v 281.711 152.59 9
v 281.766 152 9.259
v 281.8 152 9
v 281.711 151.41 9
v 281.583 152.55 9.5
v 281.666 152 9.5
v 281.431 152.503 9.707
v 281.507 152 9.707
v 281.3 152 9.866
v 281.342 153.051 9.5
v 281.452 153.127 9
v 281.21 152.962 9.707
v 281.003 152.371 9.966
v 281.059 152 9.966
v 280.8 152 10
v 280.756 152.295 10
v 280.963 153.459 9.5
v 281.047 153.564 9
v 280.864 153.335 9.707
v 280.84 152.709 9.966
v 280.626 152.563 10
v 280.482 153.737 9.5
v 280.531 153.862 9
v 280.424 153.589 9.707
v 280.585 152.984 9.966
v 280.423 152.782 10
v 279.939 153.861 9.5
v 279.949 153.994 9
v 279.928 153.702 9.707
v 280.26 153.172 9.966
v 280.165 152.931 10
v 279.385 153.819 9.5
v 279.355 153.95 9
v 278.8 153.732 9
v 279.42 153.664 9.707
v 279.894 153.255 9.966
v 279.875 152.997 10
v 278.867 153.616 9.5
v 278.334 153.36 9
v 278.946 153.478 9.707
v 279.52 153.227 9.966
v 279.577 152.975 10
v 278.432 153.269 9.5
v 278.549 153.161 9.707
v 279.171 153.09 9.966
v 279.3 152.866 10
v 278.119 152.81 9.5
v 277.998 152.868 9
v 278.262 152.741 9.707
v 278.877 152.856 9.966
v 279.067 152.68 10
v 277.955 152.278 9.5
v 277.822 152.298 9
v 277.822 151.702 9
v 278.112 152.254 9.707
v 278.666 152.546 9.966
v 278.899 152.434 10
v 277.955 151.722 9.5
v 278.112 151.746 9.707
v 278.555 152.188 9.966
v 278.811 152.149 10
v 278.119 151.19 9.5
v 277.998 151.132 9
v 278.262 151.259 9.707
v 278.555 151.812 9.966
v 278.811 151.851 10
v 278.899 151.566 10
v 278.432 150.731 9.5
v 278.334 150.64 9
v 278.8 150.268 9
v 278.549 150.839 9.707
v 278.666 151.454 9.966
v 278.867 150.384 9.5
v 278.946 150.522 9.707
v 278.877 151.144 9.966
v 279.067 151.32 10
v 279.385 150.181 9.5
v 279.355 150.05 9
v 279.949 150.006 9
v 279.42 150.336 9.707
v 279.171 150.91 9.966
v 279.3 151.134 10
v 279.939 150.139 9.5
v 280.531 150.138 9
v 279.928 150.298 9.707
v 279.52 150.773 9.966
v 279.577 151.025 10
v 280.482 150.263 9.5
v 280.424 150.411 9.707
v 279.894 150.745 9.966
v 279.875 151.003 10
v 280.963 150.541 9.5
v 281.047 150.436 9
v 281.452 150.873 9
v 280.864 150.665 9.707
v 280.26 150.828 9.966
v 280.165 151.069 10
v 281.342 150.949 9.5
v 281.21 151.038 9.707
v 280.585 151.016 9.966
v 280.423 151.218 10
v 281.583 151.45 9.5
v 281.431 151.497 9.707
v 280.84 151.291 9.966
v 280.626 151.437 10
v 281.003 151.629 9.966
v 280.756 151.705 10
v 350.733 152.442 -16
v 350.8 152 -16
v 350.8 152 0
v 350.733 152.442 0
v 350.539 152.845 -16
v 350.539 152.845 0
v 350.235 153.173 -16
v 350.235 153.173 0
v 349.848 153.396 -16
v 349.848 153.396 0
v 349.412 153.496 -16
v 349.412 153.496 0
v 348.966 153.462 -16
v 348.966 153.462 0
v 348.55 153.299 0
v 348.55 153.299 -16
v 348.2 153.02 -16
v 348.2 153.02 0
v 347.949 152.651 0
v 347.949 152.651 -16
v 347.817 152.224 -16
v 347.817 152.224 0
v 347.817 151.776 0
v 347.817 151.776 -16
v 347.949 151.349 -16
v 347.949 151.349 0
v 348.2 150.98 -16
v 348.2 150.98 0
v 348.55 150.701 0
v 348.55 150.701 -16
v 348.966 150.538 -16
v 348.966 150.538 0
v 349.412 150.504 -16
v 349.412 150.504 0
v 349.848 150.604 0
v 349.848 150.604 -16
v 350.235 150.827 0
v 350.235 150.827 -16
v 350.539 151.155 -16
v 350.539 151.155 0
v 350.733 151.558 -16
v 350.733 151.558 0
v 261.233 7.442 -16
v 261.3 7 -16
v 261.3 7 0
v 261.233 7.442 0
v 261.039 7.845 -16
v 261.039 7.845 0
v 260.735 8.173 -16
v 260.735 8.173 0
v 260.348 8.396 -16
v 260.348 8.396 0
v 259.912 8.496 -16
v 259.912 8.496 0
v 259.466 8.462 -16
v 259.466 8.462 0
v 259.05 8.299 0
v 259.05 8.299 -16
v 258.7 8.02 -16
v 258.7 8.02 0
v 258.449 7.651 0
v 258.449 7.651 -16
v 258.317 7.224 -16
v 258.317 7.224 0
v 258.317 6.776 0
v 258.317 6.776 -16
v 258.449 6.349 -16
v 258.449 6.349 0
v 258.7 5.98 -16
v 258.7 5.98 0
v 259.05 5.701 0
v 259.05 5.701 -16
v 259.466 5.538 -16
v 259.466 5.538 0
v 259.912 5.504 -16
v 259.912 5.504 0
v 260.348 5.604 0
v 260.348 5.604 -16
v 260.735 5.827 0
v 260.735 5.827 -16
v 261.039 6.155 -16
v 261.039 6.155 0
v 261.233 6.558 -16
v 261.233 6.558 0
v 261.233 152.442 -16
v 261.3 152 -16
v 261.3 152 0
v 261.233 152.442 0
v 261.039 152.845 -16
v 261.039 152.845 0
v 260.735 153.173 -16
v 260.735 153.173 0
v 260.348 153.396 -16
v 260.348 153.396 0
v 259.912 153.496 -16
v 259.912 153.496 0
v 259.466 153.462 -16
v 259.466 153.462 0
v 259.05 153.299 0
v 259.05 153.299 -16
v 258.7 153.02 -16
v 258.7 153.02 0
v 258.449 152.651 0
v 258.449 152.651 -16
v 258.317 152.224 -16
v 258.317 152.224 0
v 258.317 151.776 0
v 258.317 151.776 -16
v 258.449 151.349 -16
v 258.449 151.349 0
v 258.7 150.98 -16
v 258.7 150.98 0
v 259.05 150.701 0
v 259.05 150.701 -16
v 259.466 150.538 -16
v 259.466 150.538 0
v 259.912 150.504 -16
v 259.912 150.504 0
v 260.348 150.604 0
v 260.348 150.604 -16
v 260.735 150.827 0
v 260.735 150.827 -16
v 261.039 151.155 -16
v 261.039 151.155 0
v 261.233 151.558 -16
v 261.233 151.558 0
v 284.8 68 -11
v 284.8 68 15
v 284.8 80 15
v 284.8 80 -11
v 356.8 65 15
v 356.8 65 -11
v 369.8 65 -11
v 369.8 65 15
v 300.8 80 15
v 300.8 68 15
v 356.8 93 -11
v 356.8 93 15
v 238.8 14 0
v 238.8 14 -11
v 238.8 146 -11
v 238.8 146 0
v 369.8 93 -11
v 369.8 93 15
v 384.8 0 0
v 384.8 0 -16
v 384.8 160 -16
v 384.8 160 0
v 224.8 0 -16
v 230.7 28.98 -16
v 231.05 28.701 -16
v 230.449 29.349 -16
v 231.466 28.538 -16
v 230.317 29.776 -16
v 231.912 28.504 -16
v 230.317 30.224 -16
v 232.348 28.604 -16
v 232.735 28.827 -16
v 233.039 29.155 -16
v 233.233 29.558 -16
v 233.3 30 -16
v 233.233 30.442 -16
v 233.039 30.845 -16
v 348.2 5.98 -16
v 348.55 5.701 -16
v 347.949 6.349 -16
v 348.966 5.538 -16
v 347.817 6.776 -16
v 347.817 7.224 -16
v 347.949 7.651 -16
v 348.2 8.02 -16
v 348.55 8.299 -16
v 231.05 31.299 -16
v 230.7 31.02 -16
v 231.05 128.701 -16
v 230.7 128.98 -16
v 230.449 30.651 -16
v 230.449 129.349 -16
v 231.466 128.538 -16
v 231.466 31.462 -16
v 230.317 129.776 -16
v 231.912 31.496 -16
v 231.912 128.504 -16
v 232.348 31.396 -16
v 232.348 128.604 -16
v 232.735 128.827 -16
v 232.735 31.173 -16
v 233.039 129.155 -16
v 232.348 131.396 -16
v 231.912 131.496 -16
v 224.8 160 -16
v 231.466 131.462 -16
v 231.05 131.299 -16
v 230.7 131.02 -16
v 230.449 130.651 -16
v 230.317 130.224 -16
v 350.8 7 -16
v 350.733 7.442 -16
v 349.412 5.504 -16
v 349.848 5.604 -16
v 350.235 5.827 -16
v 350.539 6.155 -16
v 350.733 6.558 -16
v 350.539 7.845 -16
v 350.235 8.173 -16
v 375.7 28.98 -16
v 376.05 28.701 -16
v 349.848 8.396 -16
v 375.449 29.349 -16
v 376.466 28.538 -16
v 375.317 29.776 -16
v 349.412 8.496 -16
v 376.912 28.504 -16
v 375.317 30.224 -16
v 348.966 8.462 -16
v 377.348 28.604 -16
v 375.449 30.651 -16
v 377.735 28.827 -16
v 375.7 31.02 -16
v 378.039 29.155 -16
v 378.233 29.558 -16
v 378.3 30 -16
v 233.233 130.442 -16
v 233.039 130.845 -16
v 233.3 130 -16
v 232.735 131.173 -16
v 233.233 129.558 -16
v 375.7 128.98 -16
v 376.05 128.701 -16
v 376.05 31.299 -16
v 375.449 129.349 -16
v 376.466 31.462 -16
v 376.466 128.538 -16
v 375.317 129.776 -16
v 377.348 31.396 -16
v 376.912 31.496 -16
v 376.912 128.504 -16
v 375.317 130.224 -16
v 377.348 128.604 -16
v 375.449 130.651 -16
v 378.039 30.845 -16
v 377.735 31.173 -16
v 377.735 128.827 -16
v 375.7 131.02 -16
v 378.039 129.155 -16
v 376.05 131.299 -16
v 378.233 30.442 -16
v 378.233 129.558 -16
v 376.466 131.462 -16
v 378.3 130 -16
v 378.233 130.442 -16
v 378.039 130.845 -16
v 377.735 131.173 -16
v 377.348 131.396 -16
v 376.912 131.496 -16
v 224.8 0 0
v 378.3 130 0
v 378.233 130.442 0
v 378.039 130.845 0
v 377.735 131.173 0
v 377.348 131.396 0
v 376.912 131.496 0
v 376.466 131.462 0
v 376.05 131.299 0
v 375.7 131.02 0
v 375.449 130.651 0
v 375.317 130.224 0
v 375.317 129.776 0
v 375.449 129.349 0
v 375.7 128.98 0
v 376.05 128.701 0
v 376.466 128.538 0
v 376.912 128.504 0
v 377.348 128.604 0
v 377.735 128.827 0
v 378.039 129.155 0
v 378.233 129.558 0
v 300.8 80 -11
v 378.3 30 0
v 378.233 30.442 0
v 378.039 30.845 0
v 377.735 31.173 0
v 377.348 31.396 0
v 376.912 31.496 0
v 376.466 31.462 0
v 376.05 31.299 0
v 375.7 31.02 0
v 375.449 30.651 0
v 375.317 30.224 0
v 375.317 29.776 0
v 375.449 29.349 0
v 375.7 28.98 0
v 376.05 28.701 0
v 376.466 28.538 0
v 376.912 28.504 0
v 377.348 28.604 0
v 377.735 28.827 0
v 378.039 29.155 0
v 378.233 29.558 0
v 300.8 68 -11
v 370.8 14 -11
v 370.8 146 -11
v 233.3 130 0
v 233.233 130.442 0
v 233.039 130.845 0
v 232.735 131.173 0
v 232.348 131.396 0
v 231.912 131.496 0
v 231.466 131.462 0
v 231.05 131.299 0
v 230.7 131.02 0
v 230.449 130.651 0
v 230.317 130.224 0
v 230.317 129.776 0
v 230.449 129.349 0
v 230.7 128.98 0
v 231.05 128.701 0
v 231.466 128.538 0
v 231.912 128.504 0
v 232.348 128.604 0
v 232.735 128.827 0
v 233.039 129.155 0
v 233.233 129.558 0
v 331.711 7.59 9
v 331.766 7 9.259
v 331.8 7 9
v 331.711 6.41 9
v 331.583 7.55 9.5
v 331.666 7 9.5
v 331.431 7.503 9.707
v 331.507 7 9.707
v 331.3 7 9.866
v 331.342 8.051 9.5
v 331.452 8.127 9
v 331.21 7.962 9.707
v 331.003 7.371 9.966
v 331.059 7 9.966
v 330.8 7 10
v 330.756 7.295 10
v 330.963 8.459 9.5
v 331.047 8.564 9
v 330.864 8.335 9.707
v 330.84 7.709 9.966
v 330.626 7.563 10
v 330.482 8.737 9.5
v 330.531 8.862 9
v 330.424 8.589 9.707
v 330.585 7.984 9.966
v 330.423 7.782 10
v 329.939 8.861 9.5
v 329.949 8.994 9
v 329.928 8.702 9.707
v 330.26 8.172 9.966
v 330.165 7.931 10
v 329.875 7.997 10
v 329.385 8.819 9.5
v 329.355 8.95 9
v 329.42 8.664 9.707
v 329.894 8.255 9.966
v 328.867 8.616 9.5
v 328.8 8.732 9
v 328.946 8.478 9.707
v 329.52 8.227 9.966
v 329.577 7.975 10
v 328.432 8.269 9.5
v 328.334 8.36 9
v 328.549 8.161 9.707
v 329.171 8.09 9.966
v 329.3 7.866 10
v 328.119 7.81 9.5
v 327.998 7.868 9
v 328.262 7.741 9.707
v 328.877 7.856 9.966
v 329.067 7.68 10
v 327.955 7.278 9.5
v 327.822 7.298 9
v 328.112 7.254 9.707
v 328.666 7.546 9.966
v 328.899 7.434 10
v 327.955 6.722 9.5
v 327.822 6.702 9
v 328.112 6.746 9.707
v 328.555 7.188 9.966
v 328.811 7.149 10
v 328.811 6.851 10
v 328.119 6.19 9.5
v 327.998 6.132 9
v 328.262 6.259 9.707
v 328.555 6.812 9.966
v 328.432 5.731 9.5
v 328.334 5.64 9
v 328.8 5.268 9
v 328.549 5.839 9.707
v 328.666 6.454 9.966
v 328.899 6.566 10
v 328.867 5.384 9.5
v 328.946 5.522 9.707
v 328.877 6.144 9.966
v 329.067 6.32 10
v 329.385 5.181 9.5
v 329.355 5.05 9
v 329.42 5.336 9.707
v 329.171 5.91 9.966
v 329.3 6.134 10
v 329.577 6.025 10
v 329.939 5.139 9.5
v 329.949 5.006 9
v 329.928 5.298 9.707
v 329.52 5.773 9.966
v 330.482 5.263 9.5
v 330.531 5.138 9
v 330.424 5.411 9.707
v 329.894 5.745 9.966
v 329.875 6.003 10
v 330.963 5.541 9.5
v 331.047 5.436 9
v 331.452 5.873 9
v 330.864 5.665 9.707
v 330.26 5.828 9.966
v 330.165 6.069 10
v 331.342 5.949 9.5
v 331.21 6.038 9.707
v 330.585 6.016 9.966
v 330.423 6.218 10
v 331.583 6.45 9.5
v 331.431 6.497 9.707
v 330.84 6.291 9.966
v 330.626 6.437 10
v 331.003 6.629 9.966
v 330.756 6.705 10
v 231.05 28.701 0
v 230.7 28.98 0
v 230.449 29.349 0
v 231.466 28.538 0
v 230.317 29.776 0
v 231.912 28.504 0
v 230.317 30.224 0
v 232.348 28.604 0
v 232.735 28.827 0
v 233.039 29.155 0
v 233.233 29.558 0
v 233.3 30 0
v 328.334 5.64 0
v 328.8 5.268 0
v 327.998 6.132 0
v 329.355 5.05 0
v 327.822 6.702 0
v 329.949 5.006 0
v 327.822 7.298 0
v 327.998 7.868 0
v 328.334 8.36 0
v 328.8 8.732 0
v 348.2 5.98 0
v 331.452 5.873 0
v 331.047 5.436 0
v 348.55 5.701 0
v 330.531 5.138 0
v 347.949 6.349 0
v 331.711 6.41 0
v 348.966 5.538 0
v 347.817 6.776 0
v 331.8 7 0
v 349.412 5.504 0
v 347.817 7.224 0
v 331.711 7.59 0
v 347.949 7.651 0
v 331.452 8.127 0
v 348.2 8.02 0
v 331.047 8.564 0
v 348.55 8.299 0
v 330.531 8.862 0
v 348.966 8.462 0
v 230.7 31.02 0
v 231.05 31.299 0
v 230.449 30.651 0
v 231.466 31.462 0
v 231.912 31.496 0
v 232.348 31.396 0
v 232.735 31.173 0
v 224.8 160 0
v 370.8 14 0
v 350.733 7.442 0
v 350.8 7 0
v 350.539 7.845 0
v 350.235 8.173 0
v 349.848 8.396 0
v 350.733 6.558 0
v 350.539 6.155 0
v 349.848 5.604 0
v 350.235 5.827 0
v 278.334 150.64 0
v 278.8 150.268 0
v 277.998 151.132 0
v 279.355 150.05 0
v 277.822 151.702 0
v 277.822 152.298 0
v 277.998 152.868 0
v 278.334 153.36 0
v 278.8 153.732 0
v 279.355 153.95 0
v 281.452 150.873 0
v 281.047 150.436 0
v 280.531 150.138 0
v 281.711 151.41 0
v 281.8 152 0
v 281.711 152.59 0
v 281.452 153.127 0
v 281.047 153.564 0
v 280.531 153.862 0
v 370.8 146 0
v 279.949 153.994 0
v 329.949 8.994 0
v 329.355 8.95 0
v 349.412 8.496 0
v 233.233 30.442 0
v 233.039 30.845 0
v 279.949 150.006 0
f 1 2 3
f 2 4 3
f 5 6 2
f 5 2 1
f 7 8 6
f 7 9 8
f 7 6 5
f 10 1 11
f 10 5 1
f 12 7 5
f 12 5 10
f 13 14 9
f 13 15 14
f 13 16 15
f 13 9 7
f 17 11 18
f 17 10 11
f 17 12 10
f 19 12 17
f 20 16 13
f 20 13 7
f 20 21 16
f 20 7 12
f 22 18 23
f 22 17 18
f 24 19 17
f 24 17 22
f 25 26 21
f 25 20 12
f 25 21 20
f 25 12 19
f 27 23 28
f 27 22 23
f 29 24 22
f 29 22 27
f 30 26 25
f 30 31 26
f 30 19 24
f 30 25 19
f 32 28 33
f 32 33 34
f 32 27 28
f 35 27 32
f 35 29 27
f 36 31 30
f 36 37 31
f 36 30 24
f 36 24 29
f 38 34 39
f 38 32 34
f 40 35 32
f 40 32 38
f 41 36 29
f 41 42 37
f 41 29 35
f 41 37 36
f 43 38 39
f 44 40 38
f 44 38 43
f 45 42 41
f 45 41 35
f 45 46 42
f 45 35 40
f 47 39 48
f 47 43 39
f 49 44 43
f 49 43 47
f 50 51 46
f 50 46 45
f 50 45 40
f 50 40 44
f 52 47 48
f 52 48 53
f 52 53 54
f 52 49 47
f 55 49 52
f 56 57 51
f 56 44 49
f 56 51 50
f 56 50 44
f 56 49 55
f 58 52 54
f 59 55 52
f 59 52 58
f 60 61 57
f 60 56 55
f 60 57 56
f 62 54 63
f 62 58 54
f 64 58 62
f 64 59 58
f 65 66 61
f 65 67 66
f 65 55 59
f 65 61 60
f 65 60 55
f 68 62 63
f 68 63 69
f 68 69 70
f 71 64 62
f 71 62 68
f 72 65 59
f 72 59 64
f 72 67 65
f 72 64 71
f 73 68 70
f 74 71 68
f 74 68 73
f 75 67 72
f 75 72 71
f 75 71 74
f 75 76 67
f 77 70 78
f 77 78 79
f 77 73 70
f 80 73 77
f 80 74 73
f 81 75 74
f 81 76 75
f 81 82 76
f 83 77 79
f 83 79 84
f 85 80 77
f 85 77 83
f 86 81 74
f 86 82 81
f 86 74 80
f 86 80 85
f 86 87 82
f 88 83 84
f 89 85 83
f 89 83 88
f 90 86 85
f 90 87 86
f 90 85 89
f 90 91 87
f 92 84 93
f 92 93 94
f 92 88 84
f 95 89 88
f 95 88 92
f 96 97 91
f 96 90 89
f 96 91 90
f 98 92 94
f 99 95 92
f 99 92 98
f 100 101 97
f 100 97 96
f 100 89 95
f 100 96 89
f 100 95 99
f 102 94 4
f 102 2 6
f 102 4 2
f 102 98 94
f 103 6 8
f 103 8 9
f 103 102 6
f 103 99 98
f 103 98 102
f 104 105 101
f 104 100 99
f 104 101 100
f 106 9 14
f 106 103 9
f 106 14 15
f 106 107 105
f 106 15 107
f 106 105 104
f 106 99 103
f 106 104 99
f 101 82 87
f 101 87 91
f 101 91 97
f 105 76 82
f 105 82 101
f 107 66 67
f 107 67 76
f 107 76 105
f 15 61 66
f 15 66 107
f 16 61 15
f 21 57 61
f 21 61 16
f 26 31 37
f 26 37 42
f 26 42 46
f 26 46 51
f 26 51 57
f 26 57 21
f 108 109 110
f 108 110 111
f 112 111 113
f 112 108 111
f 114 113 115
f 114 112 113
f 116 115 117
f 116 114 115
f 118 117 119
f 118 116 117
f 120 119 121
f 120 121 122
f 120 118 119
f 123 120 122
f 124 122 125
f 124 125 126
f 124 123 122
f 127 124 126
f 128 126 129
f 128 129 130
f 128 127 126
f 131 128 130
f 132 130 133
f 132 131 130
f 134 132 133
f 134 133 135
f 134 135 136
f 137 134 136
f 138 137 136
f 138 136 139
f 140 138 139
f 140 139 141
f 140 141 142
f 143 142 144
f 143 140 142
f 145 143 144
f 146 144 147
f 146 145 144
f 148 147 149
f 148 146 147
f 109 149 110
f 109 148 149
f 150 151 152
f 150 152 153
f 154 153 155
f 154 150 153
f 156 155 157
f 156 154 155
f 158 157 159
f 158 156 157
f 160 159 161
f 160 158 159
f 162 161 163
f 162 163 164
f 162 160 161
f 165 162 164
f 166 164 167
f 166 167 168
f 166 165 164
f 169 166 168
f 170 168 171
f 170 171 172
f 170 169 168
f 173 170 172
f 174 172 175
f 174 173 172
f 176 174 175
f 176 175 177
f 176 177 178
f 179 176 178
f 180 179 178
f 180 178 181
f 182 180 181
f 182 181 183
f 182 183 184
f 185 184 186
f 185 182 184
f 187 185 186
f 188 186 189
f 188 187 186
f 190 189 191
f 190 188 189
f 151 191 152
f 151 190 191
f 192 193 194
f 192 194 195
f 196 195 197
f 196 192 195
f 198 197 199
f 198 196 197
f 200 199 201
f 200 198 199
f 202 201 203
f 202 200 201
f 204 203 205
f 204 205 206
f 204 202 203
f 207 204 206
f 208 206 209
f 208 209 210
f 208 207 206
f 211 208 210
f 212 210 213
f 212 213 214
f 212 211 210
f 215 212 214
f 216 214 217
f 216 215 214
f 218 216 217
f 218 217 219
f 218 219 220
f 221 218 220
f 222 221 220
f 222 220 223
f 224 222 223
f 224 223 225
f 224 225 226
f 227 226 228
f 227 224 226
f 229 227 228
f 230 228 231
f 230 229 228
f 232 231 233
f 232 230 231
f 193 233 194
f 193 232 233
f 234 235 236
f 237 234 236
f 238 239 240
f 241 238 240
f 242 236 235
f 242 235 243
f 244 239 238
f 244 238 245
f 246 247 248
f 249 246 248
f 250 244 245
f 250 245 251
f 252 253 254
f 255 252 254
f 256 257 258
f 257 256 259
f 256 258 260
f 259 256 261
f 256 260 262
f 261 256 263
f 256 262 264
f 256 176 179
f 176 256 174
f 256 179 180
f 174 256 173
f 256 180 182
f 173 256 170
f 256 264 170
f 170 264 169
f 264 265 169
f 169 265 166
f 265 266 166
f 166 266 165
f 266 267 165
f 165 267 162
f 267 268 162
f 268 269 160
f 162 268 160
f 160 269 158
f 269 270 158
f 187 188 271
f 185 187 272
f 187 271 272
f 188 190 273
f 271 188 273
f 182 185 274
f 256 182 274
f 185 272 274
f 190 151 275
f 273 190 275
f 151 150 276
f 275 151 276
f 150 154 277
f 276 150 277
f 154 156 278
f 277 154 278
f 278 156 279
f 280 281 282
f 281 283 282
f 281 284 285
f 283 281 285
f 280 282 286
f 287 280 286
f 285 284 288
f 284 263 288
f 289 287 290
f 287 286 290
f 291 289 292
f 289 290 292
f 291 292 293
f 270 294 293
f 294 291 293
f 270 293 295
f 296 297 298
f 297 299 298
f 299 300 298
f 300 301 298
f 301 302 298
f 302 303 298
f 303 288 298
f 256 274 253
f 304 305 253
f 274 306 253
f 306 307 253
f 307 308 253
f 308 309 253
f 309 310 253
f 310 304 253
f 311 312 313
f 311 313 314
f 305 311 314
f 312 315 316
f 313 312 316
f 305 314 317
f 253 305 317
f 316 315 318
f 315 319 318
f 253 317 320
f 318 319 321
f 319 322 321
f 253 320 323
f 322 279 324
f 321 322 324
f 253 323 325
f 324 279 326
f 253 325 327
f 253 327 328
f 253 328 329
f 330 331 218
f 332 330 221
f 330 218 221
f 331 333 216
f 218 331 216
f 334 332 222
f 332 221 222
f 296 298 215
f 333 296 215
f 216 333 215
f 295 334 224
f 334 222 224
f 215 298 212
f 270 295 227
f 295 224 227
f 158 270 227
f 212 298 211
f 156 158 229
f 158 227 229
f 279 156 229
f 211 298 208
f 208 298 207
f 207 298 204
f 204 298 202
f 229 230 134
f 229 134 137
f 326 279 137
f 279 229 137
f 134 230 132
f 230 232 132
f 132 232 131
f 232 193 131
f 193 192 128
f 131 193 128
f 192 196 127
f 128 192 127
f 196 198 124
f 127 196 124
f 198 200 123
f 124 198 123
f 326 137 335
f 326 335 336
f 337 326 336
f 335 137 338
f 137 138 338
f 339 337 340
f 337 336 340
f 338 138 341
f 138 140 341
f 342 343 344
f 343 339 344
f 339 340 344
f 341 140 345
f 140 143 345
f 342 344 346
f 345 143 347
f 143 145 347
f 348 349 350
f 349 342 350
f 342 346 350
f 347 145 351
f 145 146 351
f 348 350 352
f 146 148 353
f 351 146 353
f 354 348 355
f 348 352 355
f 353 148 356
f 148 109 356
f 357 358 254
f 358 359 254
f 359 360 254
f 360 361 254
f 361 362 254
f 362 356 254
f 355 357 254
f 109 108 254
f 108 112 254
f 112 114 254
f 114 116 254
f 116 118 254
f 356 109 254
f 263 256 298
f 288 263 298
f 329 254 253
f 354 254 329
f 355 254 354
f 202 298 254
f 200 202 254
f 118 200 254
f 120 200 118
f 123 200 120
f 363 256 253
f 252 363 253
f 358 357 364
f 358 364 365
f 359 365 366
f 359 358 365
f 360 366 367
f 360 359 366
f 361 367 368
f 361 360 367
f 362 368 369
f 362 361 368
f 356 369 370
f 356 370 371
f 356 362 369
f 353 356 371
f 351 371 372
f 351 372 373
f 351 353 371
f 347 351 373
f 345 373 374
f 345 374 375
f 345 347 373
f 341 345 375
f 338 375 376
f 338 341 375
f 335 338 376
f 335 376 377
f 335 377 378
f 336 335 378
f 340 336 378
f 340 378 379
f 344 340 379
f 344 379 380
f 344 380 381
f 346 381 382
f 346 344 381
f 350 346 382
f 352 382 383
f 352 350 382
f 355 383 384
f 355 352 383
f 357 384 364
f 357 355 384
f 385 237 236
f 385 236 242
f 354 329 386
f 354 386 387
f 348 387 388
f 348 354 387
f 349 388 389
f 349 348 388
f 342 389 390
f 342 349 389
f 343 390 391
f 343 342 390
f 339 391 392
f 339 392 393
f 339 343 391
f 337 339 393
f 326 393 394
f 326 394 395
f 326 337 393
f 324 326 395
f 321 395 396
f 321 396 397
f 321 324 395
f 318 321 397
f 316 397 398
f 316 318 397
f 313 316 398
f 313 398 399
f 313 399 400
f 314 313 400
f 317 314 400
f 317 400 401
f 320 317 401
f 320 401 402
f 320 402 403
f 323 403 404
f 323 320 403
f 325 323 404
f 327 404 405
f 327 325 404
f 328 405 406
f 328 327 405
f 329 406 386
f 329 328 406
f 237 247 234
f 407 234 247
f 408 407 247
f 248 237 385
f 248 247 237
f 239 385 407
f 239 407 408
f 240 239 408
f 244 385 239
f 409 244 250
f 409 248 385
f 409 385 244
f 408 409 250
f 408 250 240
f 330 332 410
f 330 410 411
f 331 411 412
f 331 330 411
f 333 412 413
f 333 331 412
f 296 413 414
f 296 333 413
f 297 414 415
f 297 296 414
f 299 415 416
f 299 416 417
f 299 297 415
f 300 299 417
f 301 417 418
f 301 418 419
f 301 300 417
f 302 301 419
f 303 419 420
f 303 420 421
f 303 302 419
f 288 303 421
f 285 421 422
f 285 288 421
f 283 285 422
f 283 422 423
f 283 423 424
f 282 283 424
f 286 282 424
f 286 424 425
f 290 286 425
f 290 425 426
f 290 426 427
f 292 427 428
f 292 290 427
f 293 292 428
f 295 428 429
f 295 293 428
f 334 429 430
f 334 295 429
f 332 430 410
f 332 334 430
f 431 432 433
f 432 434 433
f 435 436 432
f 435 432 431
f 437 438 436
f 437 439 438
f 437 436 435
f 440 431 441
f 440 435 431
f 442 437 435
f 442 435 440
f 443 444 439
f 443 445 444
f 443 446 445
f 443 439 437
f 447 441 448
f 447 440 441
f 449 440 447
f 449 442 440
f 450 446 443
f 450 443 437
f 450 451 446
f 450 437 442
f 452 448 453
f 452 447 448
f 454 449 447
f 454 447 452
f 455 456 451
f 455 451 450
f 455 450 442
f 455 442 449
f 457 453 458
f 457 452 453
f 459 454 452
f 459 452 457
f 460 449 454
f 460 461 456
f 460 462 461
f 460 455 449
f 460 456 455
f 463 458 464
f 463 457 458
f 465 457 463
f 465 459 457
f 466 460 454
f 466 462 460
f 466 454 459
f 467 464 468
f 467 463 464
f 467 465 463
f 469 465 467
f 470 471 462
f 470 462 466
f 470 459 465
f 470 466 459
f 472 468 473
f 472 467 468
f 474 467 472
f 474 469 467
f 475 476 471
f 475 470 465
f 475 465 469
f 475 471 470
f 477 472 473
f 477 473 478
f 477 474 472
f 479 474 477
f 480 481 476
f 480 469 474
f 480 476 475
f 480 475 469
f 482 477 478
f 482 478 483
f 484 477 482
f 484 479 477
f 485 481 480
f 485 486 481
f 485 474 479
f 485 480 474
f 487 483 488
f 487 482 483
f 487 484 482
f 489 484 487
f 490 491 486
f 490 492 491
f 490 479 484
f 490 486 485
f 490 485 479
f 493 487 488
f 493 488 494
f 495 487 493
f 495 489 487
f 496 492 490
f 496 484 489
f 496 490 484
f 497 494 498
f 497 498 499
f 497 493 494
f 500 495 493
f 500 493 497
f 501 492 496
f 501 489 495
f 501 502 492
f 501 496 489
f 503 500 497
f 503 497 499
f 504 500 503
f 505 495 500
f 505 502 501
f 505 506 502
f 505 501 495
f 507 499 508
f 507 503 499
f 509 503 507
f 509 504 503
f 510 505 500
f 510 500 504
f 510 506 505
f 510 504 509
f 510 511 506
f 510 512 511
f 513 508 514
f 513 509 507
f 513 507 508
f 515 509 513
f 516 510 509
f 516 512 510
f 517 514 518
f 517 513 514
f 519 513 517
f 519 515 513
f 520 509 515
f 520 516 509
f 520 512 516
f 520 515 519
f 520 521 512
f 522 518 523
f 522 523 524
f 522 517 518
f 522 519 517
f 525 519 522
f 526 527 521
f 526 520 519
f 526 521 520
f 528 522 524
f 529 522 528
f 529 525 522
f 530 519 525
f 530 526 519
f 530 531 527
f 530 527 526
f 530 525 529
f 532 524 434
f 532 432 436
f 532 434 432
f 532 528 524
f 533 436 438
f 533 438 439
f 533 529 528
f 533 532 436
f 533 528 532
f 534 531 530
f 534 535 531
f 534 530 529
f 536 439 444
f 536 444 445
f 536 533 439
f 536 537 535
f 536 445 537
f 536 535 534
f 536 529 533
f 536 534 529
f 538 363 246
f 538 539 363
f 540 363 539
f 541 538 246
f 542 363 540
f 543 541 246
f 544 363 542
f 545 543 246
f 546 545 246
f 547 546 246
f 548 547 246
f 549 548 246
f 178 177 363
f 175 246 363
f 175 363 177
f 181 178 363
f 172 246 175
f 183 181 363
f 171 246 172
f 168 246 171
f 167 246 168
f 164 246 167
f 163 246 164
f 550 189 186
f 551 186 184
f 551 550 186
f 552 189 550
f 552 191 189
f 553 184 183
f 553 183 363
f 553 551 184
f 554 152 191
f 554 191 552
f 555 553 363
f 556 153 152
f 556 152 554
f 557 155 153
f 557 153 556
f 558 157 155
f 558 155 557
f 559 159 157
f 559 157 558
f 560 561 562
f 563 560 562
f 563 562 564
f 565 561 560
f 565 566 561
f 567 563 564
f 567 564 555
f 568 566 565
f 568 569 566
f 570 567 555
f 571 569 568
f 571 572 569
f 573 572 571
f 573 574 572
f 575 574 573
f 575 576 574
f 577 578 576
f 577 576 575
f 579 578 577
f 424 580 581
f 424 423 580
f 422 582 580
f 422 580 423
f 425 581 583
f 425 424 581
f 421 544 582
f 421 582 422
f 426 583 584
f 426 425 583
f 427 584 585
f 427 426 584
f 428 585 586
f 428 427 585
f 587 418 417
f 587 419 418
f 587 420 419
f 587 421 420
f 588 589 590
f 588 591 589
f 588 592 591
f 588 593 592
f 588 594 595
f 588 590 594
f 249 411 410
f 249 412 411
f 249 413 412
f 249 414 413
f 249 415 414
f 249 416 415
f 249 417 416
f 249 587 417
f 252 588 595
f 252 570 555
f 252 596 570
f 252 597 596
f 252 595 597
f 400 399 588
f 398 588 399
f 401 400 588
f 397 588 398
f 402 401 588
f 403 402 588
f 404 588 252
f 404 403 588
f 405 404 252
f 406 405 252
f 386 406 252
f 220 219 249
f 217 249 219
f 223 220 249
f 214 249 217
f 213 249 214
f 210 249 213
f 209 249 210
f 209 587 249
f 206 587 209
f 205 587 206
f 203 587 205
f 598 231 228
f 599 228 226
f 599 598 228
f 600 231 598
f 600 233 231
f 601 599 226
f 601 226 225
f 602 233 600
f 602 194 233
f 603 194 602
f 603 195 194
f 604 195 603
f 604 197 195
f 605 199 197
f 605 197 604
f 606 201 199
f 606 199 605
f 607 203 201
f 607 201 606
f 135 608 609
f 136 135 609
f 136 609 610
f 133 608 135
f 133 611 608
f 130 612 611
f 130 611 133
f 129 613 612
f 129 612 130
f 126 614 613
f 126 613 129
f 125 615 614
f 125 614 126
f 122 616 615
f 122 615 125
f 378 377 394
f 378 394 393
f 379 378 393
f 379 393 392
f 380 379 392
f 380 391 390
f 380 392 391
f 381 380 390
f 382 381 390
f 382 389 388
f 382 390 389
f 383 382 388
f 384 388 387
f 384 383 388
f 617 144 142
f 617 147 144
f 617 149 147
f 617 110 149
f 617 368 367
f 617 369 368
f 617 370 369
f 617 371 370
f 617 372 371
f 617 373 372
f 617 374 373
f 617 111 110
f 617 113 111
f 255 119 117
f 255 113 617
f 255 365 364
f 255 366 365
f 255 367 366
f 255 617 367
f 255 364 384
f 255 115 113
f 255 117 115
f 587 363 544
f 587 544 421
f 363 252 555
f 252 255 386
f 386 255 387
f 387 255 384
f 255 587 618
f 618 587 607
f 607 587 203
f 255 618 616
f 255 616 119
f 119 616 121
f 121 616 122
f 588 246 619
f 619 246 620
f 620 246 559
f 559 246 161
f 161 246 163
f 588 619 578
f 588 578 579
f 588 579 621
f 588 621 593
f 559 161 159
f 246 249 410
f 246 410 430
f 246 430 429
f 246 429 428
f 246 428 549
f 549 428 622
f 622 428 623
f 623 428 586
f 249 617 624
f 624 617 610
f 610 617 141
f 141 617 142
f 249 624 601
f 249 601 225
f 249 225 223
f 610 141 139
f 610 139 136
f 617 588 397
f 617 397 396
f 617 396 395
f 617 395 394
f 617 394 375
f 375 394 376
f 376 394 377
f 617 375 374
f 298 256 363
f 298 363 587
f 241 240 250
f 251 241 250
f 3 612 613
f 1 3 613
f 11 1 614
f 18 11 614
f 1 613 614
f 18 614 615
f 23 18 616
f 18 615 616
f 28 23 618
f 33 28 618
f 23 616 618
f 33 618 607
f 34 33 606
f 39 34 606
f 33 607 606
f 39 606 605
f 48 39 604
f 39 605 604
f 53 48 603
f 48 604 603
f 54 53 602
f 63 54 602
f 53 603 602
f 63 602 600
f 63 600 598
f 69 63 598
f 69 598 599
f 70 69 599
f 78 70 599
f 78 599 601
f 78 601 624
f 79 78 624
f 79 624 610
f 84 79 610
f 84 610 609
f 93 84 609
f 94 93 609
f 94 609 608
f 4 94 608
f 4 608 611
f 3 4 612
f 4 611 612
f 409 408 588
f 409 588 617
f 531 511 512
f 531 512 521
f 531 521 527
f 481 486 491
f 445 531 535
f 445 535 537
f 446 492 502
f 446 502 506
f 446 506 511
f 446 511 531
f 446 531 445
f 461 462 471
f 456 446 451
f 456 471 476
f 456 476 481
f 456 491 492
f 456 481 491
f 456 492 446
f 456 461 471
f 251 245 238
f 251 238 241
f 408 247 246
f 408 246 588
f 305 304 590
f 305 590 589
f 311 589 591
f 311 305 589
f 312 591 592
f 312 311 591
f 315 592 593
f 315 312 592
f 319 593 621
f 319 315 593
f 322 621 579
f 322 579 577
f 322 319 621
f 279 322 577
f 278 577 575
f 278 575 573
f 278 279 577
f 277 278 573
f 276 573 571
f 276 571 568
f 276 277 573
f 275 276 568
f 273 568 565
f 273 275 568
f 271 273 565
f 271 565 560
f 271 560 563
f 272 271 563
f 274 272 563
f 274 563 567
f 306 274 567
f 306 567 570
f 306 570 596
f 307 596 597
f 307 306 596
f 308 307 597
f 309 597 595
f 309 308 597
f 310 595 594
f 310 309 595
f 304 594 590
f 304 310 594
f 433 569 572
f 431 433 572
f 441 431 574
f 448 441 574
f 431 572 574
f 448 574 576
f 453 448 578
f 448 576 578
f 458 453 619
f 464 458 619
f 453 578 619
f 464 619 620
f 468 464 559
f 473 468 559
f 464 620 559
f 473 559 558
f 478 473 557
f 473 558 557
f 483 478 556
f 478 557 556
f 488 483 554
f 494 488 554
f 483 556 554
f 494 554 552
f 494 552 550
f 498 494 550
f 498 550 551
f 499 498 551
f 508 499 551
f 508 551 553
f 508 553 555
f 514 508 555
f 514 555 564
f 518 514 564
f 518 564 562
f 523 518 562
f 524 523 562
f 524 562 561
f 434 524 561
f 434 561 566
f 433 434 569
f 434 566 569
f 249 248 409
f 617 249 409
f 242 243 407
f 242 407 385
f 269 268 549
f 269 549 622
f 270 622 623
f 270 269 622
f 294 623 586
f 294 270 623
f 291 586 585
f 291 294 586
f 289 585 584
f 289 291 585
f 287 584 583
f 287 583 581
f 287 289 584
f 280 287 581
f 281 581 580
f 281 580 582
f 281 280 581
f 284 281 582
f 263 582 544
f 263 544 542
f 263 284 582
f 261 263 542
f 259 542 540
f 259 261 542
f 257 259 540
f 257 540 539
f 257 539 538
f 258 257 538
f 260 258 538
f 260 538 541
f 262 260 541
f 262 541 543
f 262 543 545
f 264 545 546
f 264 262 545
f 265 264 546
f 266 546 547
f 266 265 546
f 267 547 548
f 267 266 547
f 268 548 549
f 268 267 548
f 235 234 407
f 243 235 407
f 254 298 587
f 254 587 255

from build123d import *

# Parameters (mm, degrees)
CYLINDER009_R     = 2
CYLINDER009_DEPTH = 10
FILLET_R          = 1
CYLINDER008_R     = 2
CYLINDER008_DEPTH = 10
FILLET001_R       = 1
BOX002_W          = 16
BOX002_H          = 12
BOX002_DEPTH      = 26
BOX003_W          = 13
BOX003_H          = 28
BOX003_DEPTH      = 26
CYLINDER_R        = 1.5
CYLINDER_DEPTH    = 16
CYLINDER001_R     = 1.5
CYLINDER001_DEPTH = 16
CYLINDER002_R     = 1.5
CYLINDER002_DEPTH = 16
CYLINDER003_R     = 1.5
CYLINDER003_DEPTH = 16
CYLINDER004_R     = 1.5
CYLINDER004_DEPTH = 16
CYLINDER005_R     = 1.5
CYLINDER005_DEPTH = 16
CYLINDER006_R     = 1.5
CYLINDER006_DEPTH = 16
CYLINDER007_R     = 1.5
CYLINDER007_DEPTH = 16
BOX001_W          = 132
BOX001_H          = 132
BOX001_DEPTH      = 11
BOX_W             = 160
BOX_H             = 160
BOX_DEPTH         = 16


with BuildPart() as fillet_body:
    # Cylinder009 → Cylinder009 (new body)
    with BuildSketch(Plane(origin=(55, 152, 16), x_dir=(1, 0, 0), z_dir=(0, 0, 1))):
        Circle(CYLINDER009_R)
    extrude(amount=CYLINDER009_DEPTH)

    # Fillet
    fillet_edges = [fillet_body.edges().sort_by_distance(p)[0] for p in [
        (53, 152, 26),
    ]]
    fillet(fillet_edges, radius=FILLET_R)


with BuildPart() as fillet001:
    # Cylinder008 → Cylinder008 (new body)
    with BuildSketch(Plane(origin=(105, 7, 16), x_dir=(1, 0, 0), z_dir=(0, 0, 1))):
        Circle(CYLINDER008_R)
    extrude(amount=CYLINDER008_DEPTH)

    # Fillet001
    fillet001_edges = [fillet001.edges().sort_by_distance(p)[0] for p in [
        (103, 7, 26),
    ]]
    fillet(fillet001_edges, radius=FILLET001_R)


with BuildPart() as cube002:
    # Box002 → Box002 (new body)
    with BuildSketch(Plane(origin=(60, 68, 5), x_dir=(1, 0, 0), z_dir=(0, 0, 1))):
        with Locations((8, 6)):
            Rectangle(BOX002_W, BOX002_H)
    extrude(amount=BOX002_DEPTH)


with BuildPart() as cube003:
    # Box003 → Box003 (new body)
    with BuildSketch(Plane(origin=(132, 65, 5), x_dir=(1, 0, 0), z_dir=(0, 0, 1))):
        with Locations((6.5, 14)):
            Rectangle(BOX003_W, BOX003_H)
    extrude(amount=BOX003_DEPTH)


with BuildPart() as cylinder:
    # Cylinder → Cylinder (new body)
    with BuildSketch(Plane(origin=(35, 7, 0), x_dir=(1, 0, 0), z_dir=(0, 0, 1))):
        Circle(CYLINDER_R)
    extrude(amount=CYLINDER_DEPTH)


with BuildPart() as cylinder001:
    # Cylinder001 → Cylinder001 (new body)
    with BuildSketch(Plane(origin=(124.5, 7, 0), x_dir=(1, 0, 0), z_dir=(0, 0, 1))):
        Circle(CYLINDER001_R)
    extrude(amount=CYLINDER001_DEPTH)


with BuildPart() as cylinder002:
    # Cylinder002 → Cylinder002 (new body)
    with BuildSketch(Plane(origin=(35, 152, 0), x_dir=(1, 0, 0), z_dir=(0, 0, 1))):
        Circle(CYLINDER002_R)
    extrude(amount=CYLINDER002_DEPTH)


with BuildPart() as cylinder003:
    # Cylinder003 → Cylinder003 (new body)
    with BuildSketch(Plane(origin=(124.5, 152, 0), x_dir=(1, 0, 0), z_dir=(0, 0, 1))):
        Circle(CYLINDER003_R)
    extrude(amount=CYLINDER003_DEPTH)


with BuildPart() as cylinder004:
    # Cylinder004 → Cylinder004 (new body)
    with BuildSketch(Plane(origin=(7, 30, 0), x_dir=(1, 0, 0), z_dir=(0, 0, 1))):
        Circle(CYLINDER004_R)
    extrude(amount=CYLINDER004_DEPTH)


with BuildPart() as cylinder005:
    # Cylinder005 → Cylinder005 (new body)
    with BuildSketch(Plane(origin=(7, 130, 0), x_dir=(1, 0, 0), z_dir=(0, 0, 1))):
        Circle(CYLINDER005_R)
    extrude(amount=CYLINDER005_DEPTH)


with BuildPart() as cylinder006:
    # Cylinder006 → Cylinder006 (new body)
    with BuildSketch(Plane(origin=(152, 30, 0), x_dir=(1, 0, 0), z_dir=(0, 0, 1))):
        Circle(CYLINDER006_R)
    extrude(amount=CYLINDER006_DEPTH)


with BuildPart() as anchor_holes:
    # Cylinder007 → Cylinder007 (new body)
    with BuildSketch(Plane(origin=(152, 130, 0), x_dir=(1, 0, 0), z_dir=(0, 0, 1))):
        Circle(CYLINDER007_R)
    extrude(amount=CYLINDER007_DEPTH)

    # Fusion: union Cylinder, Cylinder001, Cylinder002, Cylinder003, Cylinder004, Cylinder005, Cylinder006
    add(cylinder.part)
    add(cylinder001.part)
    add(cylinder002.part)
    add(cylinder003.part)
    add(cylinder004.part)
    add(cylinder005.part)
    add(cylinder006.part)


with BuildPart() as cube001:
    # Box001 → Box001 (new body)
    with BuildSketch(Plane(origin=(14, 14, 5), x_dir=(1, 0, 0), z_dir=(0, 0, 1))):
        with Locations((66, 66)):
            Rectangle(BOX001_W, BOX001_H)
    extrude(amount=BOX001_DEPTH)


with BuildPart() as led_array:
    # Box → Box (new body)
    with BuildSketch(Plane.XY):
        with Locations((80, 80)):
            Rectangle(BOX_W, BOX_H)
    extrude(amount=BOX_DEPTH)

    # Cut: cut Cube001
    add(cube001.part, mode=Mode.SUBTRACT)

    # Cut001: cut Anchor Holes
    add(anchor_holes.part, mode=Mode.SUBTRACT)

    # Fusion001: union Cube002, Cube003
    add(cube002.part)
    add(cube003.part)

    # Fusion002: union Fillet body, Fillet001
    add(fillet_body.part)
    add(fillet001.part)


with BuildPart() as led_array_1:
    # Fusion002 placement: moved
    add(led_array.part.moved(Location((224.8, 0, -16))))


solid = led_array_1.part
